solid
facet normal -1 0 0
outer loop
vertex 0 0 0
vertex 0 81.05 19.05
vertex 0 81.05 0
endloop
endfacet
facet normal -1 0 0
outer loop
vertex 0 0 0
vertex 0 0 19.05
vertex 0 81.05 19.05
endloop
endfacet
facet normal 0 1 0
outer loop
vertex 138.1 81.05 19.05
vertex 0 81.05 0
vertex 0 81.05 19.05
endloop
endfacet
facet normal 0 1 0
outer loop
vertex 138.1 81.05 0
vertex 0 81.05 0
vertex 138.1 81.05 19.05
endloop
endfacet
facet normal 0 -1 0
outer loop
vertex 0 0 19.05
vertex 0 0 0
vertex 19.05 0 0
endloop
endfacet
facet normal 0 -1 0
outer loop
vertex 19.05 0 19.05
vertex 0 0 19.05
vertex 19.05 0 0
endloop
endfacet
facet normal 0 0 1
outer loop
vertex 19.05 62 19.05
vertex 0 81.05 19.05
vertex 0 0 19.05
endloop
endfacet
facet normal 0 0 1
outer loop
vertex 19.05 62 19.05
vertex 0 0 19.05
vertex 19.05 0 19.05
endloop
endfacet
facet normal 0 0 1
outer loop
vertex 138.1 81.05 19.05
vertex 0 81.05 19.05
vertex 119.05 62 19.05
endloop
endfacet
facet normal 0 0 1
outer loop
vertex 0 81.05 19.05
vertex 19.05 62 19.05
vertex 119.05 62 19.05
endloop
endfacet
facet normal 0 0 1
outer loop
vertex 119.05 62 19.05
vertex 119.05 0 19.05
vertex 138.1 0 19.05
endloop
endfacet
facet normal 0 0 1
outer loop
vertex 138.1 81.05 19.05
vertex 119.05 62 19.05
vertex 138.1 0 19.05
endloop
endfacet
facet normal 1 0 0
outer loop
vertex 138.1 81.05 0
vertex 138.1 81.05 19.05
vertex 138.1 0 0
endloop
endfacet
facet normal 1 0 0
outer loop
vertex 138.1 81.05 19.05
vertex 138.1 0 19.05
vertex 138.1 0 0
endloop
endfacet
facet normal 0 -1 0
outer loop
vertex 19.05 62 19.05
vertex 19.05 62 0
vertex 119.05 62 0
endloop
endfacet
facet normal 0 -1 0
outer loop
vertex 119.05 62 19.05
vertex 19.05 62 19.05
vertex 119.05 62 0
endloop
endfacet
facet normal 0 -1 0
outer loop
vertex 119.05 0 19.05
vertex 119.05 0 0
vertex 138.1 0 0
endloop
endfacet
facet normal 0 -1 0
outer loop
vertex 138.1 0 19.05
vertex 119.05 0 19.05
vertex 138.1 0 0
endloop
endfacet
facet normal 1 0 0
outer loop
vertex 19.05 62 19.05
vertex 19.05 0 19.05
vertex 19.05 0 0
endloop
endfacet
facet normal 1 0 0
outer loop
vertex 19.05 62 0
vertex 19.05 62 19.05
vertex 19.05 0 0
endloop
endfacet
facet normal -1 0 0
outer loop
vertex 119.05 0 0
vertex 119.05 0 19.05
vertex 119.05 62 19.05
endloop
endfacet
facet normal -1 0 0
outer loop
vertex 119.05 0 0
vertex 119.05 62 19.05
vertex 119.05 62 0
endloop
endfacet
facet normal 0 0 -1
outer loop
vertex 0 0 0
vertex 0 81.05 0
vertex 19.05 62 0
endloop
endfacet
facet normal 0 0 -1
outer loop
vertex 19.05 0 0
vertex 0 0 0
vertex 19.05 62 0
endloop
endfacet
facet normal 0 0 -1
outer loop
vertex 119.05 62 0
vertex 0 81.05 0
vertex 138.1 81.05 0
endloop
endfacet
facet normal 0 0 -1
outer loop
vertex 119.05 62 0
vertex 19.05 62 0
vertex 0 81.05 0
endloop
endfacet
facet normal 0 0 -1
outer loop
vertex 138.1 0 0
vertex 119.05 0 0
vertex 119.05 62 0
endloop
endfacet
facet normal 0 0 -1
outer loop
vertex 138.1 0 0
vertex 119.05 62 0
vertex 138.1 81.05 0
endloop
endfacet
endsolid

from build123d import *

# Parameters (mm, degrees)
SKETCH2_W             = 19.05
SKETCH2_H             = 19.05
BOSS_EXTRUDE1_DEPTH   = 62
BOSS_EXTRUDE1_2_DEPTH = 62
SKETCH3_W             = 138.1
SKETCH3_H             = 19.05
BOSS_EXTRUDE2_DEPTH   = 19.05


with BuildPart() as part:
    # Sketch2 → Boss-Extrude1 (new body)
    with BuildSketch(Plane(origin=(0, 0, 0), x_dir=(1, 0, 0), z_dir=(0, 1, 0))):
        with Locations((9.525, -9.525)):
            Rectangle(SKETCH2_W, SKETCH2_H)
    extrude(amount=BOSS_EXTRUDE1_DEPTH)



with BuildPart() as body_2:
    # Sketch2 → Boss-Extrude1 2 (new body)
    with BuildSketch(Plane(origin=(0, 0, 0), x_dir=(1, 0, 0), z_dir=(0, 1, 0))):
        with Locations((128.575, -9.525)):
            Rectangle(SKETCH2_W, SKETCH2_H)
    extrude(amount=BOSS_EXTRUDE1_2_DEPTH)


with BuildPart() as part_1:
    add(part.part)

    add(body_2.part)  # Boss-Extrude2 merges body 2
    # Sketch3 → Boss-Extrude2 (add)
    with BuildSketch(Plane(origin=(0, 62, 0), x_dir=(1, 0, 0), z_dir=(0, 1, 0))):
        with Locations((69.05, -9.525)):
            Rectangle(SKETCH3_W, SKETCH3_H)
    extrude(amount=BOSS_EXTRUDE2_DEPTH)


solid = part_1.part
